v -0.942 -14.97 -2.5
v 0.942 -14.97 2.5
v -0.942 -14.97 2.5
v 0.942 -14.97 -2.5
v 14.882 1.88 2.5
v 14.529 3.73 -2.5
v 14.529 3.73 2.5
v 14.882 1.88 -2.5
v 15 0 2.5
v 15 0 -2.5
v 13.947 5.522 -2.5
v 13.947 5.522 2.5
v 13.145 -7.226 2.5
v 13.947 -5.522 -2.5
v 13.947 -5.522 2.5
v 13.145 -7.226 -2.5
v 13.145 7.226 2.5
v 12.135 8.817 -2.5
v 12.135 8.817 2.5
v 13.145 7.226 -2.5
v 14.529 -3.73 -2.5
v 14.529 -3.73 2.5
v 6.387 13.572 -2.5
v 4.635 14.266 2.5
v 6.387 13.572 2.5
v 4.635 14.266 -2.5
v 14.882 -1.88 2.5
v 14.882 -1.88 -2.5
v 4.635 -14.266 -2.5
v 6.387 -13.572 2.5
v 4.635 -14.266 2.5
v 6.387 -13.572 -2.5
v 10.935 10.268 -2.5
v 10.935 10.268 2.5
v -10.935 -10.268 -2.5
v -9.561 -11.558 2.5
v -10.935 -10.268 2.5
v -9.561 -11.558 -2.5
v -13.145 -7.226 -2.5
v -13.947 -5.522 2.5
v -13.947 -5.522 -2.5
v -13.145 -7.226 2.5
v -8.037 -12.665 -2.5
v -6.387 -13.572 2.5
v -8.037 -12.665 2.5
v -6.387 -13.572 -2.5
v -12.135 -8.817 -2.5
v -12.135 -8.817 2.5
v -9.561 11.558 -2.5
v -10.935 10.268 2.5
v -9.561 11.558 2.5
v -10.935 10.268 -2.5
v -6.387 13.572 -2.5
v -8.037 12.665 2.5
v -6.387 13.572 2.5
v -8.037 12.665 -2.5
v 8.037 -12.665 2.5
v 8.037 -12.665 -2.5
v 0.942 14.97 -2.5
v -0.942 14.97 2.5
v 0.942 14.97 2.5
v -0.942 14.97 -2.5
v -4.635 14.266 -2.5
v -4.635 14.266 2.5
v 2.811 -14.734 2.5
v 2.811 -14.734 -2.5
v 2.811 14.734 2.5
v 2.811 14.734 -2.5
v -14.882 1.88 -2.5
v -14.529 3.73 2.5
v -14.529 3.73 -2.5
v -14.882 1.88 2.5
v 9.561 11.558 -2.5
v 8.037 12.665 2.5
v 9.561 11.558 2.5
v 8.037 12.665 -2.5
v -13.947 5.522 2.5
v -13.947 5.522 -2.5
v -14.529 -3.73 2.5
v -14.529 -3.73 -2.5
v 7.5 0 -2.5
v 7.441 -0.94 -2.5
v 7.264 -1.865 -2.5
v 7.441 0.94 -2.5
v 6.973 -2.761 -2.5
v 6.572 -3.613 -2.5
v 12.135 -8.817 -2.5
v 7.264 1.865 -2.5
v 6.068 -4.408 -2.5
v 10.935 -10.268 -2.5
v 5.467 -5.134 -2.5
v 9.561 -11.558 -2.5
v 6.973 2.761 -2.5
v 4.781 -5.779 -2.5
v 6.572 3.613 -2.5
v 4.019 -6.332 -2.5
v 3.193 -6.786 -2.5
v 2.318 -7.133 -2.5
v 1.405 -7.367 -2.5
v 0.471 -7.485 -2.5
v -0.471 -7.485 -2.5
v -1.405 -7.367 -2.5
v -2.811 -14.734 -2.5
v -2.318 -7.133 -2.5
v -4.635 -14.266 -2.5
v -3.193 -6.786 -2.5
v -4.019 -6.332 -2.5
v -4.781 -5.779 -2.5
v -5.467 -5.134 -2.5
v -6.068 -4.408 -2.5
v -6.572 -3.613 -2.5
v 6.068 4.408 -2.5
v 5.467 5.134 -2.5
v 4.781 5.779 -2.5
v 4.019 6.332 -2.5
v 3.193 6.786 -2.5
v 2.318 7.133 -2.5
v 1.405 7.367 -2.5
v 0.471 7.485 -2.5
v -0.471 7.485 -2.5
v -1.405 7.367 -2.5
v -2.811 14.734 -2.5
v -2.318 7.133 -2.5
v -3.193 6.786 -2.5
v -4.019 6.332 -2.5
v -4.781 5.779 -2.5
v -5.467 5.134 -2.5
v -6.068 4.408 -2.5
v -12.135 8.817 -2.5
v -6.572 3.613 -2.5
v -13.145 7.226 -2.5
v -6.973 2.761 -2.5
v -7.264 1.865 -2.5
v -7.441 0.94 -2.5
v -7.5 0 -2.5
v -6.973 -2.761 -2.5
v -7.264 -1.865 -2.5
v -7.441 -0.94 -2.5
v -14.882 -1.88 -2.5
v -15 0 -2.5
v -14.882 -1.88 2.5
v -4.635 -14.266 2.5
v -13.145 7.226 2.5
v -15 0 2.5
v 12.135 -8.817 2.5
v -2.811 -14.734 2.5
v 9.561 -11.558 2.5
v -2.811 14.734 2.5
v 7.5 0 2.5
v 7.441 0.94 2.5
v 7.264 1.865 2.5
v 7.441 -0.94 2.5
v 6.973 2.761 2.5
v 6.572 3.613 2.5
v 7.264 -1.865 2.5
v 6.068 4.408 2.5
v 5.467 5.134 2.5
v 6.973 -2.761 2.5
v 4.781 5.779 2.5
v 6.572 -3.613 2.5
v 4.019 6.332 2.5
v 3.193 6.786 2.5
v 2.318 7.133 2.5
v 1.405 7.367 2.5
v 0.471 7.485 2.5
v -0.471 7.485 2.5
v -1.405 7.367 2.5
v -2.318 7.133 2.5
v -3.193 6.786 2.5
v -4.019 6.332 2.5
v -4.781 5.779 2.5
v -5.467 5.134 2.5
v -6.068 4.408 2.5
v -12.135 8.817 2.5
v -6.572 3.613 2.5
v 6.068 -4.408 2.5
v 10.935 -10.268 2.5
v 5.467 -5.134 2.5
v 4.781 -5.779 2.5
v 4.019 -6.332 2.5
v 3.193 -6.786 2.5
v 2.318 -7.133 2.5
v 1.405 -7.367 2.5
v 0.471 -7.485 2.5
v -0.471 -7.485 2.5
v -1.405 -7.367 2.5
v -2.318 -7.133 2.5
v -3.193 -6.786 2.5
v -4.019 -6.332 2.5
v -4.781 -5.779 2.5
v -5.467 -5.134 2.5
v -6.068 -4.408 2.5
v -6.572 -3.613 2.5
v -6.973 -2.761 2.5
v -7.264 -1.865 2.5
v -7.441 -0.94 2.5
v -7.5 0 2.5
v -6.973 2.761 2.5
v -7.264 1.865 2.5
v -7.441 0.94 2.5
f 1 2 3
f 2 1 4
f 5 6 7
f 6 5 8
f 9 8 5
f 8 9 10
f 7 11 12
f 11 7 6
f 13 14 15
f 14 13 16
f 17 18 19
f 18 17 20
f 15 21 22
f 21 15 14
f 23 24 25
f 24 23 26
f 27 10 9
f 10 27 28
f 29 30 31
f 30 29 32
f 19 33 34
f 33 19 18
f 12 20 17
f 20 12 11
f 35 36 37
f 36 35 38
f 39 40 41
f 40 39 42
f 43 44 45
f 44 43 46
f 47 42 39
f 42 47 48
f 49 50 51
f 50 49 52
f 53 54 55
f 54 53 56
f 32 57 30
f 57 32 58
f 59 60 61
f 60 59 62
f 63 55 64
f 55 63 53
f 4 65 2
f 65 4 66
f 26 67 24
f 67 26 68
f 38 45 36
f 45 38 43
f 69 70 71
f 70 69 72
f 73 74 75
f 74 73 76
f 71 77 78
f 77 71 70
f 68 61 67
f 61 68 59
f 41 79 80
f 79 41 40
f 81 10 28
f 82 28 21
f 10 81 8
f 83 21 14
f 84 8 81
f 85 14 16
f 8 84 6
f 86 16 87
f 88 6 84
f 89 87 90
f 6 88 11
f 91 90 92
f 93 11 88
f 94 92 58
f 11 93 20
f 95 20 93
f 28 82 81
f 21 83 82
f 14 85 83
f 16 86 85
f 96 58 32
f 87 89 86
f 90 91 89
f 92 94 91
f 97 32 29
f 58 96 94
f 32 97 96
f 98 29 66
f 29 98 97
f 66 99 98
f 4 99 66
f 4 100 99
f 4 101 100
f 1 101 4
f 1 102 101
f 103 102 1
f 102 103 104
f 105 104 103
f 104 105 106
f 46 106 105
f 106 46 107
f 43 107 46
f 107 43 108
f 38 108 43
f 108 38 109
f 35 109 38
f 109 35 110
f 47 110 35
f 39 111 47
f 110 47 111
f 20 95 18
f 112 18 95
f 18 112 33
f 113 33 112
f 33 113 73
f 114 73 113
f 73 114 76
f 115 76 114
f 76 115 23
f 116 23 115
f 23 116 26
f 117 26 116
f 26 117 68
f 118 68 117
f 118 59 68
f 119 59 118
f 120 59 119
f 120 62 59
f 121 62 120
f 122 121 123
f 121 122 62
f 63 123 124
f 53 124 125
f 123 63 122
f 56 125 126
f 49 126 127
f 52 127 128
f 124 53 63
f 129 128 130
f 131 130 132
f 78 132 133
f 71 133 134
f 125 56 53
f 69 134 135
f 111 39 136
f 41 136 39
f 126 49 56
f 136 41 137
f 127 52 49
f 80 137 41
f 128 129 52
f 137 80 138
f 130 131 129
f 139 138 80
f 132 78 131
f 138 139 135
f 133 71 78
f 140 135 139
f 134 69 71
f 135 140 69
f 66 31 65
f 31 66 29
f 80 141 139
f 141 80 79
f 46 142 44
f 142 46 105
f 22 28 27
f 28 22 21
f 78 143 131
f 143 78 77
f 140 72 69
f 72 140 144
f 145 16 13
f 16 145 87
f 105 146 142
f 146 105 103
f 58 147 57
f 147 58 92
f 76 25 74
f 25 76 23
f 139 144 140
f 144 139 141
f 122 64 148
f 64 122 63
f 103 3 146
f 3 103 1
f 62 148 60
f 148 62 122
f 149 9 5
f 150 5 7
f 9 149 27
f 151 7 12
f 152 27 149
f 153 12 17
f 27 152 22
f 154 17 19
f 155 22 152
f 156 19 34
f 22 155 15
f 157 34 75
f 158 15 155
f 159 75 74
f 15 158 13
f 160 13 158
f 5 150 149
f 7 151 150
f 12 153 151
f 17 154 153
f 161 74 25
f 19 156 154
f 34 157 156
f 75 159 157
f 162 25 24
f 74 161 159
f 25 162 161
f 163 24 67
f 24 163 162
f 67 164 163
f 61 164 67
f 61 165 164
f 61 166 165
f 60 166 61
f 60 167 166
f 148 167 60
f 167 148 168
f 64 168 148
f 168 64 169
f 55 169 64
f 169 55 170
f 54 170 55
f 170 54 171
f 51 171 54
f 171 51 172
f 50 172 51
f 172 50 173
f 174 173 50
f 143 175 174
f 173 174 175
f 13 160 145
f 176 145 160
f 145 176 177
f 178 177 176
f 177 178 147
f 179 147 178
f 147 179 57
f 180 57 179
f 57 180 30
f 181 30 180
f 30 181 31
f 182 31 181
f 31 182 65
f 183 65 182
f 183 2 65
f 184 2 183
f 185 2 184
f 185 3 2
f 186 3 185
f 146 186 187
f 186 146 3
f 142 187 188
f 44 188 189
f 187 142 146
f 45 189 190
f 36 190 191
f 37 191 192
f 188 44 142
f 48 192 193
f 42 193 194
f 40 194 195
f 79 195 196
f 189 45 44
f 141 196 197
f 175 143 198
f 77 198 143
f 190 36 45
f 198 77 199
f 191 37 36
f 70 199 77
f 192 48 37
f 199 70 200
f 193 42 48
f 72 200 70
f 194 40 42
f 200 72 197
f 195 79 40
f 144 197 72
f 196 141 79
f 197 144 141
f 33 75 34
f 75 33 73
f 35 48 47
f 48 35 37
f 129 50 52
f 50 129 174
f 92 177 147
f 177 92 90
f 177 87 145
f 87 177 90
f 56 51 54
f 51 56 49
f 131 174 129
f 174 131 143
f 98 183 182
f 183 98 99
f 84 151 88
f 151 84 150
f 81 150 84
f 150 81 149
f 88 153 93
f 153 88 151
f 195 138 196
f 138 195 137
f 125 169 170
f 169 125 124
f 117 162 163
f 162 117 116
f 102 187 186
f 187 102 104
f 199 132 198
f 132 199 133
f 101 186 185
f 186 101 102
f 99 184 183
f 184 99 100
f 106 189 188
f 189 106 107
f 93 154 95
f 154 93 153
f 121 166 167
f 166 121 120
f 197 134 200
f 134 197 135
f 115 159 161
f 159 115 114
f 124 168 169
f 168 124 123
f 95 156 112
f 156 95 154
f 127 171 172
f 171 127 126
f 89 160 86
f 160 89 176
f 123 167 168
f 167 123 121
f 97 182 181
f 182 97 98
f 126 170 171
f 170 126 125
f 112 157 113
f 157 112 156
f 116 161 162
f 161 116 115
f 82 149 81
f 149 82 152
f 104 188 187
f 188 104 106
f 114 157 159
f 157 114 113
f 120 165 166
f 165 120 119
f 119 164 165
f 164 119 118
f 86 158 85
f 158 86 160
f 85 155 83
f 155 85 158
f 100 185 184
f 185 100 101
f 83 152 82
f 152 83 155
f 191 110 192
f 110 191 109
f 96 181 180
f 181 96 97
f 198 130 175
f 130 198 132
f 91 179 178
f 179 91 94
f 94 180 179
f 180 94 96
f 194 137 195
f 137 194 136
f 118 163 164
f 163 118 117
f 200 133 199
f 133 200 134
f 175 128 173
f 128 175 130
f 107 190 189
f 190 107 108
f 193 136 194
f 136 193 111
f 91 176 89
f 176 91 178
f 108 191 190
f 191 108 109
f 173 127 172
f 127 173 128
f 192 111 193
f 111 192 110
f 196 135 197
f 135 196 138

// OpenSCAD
// washer.scad
// library for parametric washer, bushing, spacer, ring or gasket
// Author: Tony Z. Tonchev, Michigan (USA) 
// last update: October 2018


// (in mm)
Outside_Diameter = 30;

// (in mm)
Inside_Diameter = 15;

// (in mm)
Thickness = 5;

/* [Hidden] */

$fn=50;
TZT_WASHER (Thickness, Outside_Diameter/2, Inside_Diameter/2);

module TZT_WASHER (TZT_Thk, TZT_RadA, TZT_RadB) {
    difference () {
        cylinder (TZT_Thk, TZT_RadA, TZT_RadA, true);
        cylinder (TZT_Thk+1, TZT_RadB, TZT_RadB, true);
    }
} 
